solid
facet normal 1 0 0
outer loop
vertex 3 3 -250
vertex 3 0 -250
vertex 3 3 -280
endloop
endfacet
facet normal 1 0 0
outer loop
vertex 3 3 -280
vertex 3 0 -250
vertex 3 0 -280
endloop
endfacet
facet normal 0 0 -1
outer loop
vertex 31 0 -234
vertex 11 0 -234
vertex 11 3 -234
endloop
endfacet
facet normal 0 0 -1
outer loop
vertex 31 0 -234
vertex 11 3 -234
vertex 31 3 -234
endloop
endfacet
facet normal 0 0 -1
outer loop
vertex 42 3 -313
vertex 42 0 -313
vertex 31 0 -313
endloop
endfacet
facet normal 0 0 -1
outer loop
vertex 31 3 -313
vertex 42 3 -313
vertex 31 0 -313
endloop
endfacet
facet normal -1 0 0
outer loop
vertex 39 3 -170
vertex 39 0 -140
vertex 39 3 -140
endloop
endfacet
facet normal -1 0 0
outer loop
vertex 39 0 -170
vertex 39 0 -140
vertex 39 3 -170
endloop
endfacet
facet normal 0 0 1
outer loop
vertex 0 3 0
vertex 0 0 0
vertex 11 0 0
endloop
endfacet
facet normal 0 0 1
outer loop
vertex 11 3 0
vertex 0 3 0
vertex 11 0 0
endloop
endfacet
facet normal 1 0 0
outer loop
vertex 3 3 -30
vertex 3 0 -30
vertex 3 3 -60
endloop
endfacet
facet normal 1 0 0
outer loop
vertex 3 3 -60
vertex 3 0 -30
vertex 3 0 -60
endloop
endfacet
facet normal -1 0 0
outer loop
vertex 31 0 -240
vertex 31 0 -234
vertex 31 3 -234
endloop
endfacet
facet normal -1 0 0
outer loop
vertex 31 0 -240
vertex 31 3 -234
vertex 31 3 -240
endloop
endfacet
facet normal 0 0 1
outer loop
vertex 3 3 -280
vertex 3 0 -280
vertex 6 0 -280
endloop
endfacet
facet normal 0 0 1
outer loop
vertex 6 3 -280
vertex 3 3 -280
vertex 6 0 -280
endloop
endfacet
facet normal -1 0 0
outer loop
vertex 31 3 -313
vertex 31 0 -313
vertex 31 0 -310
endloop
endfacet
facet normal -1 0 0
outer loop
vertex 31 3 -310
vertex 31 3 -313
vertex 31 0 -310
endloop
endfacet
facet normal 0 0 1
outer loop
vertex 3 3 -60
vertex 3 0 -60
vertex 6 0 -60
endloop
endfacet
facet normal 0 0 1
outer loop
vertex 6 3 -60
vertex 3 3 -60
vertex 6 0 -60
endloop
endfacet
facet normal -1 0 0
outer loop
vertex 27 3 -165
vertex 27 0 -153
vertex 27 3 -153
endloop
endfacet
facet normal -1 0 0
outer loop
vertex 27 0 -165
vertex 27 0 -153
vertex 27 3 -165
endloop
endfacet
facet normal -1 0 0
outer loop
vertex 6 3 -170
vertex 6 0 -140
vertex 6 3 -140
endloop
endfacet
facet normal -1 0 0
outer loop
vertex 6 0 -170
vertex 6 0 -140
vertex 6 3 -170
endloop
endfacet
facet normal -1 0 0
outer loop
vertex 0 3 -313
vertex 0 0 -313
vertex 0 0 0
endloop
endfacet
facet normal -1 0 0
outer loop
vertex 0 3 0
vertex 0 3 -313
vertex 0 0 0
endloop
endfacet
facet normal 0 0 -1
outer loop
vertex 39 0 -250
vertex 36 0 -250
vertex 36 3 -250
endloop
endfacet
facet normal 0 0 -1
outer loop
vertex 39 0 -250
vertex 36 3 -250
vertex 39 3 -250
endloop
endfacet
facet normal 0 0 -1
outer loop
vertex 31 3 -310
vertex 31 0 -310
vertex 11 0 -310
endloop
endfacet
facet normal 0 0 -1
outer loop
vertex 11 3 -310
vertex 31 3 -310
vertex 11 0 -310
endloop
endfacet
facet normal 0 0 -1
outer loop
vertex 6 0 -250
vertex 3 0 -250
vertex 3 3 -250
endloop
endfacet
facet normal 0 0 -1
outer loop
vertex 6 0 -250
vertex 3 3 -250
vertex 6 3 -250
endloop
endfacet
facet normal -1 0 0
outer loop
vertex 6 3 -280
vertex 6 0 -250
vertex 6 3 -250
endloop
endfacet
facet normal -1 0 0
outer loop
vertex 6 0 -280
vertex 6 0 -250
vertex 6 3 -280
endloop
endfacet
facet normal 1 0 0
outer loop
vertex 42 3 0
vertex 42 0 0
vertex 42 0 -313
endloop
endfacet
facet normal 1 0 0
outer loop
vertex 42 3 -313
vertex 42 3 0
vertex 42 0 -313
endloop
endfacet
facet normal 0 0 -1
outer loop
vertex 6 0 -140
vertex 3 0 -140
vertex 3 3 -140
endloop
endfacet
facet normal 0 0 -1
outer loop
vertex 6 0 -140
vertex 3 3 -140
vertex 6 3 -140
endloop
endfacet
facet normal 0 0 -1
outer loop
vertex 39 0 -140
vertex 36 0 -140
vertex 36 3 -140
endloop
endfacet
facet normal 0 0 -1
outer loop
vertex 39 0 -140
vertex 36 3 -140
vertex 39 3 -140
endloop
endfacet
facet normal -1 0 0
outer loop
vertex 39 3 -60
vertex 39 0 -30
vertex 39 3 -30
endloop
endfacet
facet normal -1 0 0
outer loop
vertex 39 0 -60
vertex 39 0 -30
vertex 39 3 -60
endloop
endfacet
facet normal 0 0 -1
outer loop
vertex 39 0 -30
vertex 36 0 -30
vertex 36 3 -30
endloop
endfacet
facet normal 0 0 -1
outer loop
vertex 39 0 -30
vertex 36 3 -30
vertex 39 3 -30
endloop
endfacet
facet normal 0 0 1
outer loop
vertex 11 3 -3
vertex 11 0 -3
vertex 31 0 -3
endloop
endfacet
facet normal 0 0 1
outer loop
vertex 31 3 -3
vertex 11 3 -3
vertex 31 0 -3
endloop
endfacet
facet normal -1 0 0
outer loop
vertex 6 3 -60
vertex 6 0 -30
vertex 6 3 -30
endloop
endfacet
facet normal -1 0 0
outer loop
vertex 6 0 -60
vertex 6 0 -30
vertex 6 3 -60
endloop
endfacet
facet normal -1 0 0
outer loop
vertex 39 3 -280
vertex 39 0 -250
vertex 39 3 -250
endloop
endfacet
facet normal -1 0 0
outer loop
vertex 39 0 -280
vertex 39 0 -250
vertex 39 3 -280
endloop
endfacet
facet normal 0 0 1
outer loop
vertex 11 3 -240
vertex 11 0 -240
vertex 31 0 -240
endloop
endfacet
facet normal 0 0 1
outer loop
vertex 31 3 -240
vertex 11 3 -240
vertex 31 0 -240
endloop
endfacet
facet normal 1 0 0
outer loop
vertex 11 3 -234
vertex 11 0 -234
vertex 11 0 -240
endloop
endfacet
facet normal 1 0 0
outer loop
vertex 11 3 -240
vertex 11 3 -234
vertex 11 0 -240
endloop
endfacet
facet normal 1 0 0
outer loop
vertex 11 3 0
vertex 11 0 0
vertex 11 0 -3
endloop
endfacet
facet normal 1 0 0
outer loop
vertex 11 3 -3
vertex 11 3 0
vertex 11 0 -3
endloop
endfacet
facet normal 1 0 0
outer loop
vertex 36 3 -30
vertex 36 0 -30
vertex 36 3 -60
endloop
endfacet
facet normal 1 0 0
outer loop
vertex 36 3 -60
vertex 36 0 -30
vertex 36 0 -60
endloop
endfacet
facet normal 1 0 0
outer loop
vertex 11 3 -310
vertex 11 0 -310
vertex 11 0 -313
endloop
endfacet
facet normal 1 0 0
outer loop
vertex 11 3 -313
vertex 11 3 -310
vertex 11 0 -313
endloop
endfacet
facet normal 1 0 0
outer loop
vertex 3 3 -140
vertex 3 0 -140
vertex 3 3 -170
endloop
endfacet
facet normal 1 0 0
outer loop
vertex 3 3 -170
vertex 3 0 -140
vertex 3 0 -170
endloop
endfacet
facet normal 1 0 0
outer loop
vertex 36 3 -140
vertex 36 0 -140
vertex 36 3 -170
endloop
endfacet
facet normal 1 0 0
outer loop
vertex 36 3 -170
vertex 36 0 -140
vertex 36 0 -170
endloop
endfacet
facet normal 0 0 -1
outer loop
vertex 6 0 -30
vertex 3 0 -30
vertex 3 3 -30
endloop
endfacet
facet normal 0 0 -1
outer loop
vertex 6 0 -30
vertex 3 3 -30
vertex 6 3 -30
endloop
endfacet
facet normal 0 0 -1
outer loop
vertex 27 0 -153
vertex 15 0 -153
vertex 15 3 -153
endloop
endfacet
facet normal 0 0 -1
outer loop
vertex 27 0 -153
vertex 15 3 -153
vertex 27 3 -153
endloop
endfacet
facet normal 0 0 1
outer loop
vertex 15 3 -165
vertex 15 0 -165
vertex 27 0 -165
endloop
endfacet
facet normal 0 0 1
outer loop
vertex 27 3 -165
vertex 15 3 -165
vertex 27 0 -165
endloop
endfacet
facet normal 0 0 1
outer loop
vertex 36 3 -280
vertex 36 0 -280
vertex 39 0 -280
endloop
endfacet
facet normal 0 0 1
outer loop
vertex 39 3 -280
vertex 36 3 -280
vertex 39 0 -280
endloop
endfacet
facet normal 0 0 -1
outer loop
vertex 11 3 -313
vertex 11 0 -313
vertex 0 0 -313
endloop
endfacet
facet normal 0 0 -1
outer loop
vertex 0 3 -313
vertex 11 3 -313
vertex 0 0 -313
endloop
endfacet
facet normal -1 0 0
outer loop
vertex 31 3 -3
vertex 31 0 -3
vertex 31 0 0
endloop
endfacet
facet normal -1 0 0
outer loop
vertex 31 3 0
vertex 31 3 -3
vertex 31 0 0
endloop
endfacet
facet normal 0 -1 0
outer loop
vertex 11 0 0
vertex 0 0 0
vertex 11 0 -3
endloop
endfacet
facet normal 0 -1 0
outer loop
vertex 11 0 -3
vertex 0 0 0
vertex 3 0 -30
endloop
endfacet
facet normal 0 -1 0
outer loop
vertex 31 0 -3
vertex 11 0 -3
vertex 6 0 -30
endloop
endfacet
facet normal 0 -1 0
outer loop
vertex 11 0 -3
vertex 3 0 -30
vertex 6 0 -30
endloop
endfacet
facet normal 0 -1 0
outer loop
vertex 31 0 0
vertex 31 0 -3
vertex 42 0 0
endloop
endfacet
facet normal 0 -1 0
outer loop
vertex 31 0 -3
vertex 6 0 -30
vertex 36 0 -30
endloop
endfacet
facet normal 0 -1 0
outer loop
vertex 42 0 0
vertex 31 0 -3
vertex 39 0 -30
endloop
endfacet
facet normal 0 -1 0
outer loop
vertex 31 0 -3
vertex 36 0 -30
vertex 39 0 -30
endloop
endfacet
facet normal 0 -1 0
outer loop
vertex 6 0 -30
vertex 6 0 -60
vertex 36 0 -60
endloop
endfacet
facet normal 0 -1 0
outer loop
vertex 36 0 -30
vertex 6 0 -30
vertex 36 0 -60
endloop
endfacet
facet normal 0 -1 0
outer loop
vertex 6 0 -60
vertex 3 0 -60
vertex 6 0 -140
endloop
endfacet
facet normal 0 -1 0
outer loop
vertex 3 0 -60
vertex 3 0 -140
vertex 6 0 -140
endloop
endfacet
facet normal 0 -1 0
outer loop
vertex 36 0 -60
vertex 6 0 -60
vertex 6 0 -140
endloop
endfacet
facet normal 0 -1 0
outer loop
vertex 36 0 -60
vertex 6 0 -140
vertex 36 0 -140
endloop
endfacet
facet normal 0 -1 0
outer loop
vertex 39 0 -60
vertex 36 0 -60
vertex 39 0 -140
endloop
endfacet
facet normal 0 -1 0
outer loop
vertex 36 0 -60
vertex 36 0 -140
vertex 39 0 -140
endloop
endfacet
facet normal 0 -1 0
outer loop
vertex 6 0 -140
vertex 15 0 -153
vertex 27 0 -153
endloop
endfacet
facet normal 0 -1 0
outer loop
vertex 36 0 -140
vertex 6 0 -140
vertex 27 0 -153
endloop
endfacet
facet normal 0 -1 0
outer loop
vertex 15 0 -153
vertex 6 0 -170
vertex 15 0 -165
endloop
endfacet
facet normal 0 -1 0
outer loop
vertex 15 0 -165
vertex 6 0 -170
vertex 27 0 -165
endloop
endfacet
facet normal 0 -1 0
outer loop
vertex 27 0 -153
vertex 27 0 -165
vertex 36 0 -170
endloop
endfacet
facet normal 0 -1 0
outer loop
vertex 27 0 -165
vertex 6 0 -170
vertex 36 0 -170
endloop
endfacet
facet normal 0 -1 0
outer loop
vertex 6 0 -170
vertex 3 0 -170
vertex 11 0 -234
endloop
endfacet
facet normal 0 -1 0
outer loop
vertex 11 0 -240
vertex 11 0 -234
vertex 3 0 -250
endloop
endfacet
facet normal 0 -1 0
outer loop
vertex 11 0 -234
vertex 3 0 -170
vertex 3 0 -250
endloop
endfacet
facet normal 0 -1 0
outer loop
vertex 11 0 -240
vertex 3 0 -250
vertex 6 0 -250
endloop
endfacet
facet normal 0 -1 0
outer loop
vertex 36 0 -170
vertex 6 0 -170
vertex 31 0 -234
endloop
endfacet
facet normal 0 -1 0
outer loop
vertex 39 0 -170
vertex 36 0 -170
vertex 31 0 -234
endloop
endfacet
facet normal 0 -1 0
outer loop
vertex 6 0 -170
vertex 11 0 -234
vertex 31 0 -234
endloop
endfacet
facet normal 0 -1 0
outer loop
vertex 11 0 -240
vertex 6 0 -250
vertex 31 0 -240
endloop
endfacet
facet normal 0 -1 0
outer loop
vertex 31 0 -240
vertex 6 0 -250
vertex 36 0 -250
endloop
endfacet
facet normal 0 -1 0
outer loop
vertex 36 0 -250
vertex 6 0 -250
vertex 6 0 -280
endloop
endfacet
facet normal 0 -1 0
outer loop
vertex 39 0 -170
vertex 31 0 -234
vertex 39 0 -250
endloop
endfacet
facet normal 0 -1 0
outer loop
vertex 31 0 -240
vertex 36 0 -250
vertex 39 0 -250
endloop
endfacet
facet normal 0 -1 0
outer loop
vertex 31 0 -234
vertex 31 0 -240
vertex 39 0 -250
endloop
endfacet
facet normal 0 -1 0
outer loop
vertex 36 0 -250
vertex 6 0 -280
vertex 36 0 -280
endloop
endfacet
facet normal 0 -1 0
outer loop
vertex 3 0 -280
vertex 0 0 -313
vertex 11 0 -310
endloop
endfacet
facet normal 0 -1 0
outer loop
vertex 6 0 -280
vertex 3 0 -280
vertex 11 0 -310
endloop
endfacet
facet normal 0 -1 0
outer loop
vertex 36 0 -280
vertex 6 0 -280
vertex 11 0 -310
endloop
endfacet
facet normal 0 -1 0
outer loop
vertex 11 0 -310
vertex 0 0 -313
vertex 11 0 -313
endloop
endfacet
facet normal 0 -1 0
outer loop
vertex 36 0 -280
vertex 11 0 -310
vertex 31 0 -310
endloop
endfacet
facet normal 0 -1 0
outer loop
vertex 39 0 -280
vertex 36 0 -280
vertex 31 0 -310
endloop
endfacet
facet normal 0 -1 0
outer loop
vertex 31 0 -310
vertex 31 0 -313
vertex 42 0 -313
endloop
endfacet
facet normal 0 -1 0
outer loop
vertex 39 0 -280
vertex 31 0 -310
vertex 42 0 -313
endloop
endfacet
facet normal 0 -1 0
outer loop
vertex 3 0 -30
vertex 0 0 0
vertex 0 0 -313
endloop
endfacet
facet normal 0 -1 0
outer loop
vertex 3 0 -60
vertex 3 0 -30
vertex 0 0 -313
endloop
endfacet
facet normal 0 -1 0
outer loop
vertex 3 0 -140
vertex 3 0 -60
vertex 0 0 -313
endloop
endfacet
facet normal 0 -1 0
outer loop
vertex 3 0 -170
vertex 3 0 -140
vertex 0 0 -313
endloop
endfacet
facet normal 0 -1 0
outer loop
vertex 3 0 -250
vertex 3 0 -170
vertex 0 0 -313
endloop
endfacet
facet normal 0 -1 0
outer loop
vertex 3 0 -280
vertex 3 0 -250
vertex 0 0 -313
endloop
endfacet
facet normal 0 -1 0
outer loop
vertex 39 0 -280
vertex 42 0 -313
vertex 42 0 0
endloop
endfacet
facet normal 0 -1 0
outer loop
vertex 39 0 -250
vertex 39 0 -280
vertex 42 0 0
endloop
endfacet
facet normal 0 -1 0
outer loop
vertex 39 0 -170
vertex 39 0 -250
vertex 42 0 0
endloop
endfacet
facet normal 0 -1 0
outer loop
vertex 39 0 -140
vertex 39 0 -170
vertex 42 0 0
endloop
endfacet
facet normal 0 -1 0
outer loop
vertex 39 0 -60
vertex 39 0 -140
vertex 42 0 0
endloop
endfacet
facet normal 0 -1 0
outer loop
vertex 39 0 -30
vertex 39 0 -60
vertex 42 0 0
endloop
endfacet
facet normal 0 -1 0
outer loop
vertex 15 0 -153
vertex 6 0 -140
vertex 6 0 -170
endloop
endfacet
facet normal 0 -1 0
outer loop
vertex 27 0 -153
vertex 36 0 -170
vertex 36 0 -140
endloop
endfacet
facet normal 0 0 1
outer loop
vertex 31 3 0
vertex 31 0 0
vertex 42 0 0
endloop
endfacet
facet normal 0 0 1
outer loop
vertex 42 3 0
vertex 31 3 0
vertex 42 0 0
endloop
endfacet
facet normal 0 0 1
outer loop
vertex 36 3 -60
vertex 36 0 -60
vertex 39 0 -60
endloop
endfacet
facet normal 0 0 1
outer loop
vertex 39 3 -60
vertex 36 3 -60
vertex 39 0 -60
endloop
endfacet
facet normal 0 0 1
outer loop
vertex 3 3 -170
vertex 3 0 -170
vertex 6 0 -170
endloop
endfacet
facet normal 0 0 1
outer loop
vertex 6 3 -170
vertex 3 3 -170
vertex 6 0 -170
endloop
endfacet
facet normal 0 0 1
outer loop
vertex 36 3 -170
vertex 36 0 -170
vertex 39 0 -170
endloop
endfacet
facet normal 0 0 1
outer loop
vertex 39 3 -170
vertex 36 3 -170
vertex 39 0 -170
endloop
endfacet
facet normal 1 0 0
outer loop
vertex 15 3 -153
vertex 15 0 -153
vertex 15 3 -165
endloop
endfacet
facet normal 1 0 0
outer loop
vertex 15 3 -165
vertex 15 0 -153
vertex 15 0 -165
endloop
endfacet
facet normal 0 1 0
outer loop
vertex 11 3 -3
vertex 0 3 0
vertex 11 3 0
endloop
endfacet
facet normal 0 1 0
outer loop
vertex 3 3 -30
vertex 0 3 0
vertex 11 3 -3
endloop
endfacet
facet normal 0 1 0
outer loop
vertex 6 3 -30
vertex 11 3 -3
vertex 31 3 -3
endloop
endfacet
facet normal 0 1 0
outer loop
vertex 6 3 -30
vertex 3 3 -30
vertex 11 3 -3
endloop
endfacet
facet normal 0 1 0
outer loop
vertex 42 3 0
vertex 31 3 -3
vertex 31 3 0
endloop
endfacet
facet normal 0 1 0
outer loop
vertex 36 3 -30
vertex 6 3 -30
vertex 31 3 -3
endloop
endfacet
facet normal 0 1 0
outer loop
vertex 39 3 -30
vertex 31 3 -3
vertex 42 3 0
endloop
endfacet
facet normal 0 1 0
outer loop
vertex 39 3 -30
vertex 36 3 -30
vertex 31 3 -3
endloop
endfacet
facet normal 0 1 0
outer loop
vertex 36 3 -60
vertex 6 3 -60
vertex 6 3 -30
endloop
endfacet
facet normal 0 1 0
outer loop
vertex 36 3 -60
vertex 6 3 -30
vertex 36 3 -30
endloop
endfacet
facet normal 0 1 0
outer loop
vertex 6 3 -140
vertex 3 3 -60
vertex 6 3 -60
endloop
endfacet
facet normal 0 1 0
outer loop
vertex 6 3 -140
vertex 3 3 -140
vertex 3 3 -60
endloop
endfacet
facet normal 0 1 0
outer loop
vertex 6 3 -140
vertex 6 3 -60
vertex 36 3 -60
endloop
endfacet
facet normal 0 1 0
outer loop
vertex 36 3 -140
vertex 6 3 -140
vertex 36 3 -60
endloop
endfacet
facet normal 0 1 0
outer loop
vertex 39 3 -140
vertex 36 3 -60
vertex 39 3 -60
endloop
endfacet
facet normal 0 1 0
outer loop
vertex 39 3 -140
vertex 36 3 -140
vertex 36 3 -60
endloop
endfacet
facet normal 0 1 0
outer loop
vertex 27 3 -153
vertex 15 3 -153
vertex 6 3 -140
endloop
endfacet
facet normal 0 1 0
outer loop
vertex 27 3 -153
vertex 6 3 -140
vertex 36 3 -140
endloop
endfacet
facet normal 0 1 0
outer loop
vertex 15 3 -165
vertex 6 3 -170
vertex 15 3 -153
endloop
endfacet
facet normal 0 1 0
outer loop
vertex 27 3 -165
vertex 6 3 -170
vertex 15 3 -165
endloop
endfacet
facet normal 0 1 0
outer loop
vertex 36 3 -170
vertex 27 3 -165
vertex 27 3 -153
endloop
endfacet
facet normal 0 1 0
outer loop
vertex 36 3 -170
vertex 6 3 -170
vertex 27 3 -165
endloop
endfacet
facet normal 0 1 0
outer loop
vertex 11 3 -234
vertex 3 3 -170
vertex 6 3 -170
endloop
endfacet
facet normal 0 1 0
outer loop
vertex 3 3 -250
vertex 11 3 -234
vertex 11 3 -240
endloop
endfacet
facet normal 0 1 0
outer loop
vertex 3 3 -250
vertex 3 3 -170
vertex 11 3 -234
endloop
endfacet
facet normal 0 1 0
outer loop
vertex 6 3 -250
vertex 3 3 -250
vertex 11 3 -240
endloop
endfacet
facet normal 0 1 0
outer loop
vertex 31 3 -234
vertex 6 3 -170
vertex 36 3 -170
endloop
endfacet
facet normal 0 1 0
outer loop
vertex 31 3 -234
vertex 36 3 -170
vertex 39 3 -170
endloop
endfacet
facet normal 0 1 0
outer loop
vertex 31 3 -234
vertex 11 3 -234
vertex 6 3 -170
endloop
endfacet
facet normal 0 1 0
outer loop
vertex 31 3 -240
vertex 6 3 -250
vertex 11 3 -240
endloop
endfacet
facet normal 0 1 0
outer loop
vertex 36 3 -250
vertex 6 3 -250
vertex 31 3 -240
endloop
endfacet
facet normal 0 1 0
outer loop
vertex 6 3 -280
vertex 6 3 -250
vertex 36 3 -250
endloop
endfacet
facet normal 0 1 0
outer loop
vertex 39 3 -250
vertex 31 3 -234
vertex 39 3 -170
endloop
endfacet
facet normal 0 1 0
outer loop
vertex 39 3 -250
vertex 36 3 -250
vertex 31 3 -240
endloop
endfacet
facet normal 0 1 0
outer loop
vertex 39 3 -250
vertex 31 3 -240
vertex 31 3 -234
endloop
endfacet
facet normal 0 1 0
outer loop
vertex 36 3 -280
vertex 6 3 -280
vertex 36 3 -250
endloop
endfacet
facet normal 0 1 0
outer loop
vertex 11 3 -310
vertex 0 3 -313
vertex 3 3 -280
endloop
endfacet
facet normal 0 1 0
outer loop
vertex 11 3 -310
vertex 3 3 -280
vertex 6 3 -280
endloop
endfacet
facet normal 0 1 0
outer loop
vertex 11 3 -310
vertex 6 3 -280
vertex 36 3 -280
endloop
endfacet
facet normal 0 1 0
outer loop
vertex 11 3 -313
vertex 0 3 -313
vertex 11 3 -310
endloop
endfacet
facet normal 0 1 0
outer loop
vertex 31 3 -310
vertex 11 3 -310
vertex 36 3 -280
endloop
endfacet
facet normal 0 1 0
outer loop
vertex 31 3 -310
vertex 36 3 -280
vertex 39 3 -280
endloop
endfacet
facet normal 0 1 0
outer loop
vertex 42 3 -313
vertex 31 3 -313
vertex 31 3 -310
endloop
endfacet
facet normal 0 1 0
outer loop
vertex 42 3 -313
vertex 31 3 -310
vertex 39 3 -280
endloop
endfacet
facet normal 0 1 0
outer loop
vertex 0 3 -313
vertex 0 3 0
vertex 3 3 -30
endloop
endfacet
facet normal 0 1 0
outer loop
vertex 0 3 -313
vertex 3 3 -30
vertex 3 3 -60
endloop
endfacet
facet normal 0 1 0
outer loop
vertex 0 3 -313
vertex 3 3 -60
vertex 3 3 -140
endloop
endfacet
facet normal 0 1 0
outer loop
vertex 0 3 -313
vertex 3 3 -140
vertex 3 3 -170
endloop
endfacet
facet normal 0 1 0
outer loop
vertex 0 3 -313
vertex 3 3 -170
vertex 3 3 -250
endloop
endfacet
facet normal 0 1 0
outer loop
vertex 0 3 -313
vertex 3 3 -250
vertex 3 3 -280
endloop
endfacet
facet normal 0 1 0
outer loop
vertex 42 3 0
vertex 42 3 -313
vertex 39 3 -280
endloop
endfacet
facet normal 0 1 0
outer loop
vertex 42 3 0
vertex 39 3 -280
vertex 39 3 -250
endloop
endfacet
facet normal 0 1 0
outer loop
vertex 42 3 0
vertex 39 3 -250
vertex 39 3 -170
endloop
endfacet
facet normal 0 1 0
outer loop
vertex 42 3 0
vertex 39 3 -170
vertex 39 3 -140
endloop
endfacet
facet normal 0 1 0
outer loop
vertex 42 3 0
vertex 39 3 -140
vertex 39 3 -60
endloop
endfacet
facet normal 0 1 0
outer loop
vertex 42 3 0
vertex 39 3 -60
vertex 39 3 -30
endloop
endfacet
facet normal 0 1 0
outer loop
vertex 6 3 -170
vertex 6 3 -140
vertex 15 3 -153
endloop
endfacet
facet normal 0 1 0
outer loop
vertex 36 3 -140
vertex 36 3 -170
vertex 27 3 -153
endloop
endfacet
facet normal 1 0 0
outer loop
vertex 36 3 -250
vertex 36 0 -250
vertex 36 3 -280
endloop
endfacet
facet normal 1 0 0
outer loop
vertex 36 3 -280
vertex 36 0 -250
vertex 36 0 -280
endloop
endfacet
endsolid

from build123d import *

# Parameters (mm, degrees)
SKETCH1_W           = 3
SKETCH1_H           = 30
SKETCH1_W_2         = 12
SKETCH1_H_2         = 12
SKETCH1_W_3         = 20
SKETCH1_H_3         = 6
BOSS_EXTRUDE1_DEPTH = 3


with BuildPart() as part:
    # Sketch1 → Boss-Extrude1 (new body)
    with BuildSketch(Plane(origin=(0, 0, 0), x_dir=(1, 0, 0), z_dir=(0, 1, 0))):
        Polygon((0, 313), (0, 0), (11, 0), (11, 3), (31, 3), (31, 0), (42, 0), (42, 313), (31, 313), (31, 310), (11, 310), (11, 313), align=None)
        with Locations((4.5, 45)):
            Rectangle(SKETCH1_W, SKETCH1_H, mode=Mode.SUBTRACT)
        with Locations((4.5, 155)):
            Rectangle(SKETCH1_W, SKETCH1_H, mode=Mode.SUBTRACT)
        with Locations((37.5, 45)):
            Rectangle(SKETCH1_W, SKETCH1_H, mode=Mode.SUBTRACT)
        with Locations((37.5, 155)):
            Rectangle(SKETCH1_W, SKETCH1_H, mode=Mode.SUBTRACT)
        with Locations((21, 159)):
            Rectangle(SKETCH1_W_2, SKETCH1_H_2, mode=Mode.SUBTRACT)
        with Locations((4.5, 265)):
            Rectangle(SKETCH1_W, SKETCH1_H, mode=Mode.SUBTRACT)
        with Locations((21, 237)):
            Rectangle(SKETCH1_W_3, SKETCH1_H_3, mode=Mode.SUBTRACT)
        with Locations((37.5, 265)):
            Rectangle(SKETCH1_W, SKETCH1_H, mode=Mode.SUBTRACT)
    extrude(amount=BOSS_EXTRUDE1_DEPTH)


solid = part.part
